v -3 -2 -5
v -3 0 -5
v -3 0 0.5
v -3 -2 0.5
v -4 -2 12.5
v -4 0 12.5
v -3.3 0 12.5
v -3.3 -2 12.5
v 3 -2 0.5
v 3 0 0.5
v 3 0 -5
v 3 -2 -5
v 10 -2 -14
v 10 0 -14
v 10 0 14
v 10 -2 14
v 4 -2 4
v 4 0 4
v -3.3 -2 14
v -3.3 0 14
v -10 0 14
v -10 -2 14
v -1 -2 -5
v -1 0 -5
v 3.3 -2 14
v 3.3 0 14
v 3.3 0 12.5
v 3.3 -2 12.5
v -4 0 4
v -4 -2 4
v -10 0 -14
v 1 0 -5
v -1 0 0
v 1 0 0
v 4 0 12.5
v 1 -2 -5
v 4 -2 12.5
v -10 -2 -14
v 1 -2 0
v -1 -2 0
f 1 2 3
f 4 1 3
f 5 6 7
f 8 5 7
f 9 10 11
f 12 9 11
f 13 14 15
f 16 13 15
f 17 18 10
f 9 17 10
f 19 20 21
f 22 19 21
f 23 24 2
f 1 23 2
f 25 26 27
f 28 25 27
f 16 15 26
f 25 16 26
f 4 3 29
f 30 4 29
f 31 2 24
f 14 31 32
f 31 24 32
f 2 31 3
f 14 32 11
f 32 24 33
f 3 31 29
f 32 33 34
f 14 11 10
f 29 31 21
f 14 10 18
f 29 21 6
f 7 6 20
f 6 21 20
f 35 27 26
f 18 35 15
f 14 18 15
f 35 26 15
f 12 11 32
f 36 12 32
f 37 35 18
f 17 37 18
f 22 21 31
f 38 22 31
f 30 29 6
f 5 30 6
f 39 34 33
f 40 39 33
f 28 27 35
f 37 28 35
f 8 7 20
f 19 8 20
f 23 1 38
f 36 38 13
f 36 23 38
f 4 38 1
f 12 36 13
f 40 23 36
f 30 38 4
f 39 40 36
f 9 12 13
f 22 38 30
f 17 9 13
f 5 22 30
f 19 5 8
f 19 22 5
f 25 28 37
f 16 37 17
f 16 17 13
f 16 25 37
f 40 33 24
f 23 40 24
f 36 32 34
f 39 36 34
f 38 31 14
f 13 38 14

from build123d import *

# Parameters (mm, degrees)
F1_DEPTH = 2


with BuildPart() as f1:
    # F0 (on Front) → F1 (new body)
    with BuildSketch(Plane.XZ):
        Polygon((-10, -14), (10, -14), (10, 14), (3.3, 14), (3.3, 12.5), (4, 12.5), (4, 4), (3, 0.5), (3, -5), (1, -5), (1, 0), (0, 0), (-1, 0), (-1, -5), (-3, -5), (-3, 0.5), (-4, 4), (-4, 12.5), (-3.3, 12.5), (-3.3, 14), (-10, 14), align=None)
    extrude(amount=F1_DEPTH)


solid = f1.part
